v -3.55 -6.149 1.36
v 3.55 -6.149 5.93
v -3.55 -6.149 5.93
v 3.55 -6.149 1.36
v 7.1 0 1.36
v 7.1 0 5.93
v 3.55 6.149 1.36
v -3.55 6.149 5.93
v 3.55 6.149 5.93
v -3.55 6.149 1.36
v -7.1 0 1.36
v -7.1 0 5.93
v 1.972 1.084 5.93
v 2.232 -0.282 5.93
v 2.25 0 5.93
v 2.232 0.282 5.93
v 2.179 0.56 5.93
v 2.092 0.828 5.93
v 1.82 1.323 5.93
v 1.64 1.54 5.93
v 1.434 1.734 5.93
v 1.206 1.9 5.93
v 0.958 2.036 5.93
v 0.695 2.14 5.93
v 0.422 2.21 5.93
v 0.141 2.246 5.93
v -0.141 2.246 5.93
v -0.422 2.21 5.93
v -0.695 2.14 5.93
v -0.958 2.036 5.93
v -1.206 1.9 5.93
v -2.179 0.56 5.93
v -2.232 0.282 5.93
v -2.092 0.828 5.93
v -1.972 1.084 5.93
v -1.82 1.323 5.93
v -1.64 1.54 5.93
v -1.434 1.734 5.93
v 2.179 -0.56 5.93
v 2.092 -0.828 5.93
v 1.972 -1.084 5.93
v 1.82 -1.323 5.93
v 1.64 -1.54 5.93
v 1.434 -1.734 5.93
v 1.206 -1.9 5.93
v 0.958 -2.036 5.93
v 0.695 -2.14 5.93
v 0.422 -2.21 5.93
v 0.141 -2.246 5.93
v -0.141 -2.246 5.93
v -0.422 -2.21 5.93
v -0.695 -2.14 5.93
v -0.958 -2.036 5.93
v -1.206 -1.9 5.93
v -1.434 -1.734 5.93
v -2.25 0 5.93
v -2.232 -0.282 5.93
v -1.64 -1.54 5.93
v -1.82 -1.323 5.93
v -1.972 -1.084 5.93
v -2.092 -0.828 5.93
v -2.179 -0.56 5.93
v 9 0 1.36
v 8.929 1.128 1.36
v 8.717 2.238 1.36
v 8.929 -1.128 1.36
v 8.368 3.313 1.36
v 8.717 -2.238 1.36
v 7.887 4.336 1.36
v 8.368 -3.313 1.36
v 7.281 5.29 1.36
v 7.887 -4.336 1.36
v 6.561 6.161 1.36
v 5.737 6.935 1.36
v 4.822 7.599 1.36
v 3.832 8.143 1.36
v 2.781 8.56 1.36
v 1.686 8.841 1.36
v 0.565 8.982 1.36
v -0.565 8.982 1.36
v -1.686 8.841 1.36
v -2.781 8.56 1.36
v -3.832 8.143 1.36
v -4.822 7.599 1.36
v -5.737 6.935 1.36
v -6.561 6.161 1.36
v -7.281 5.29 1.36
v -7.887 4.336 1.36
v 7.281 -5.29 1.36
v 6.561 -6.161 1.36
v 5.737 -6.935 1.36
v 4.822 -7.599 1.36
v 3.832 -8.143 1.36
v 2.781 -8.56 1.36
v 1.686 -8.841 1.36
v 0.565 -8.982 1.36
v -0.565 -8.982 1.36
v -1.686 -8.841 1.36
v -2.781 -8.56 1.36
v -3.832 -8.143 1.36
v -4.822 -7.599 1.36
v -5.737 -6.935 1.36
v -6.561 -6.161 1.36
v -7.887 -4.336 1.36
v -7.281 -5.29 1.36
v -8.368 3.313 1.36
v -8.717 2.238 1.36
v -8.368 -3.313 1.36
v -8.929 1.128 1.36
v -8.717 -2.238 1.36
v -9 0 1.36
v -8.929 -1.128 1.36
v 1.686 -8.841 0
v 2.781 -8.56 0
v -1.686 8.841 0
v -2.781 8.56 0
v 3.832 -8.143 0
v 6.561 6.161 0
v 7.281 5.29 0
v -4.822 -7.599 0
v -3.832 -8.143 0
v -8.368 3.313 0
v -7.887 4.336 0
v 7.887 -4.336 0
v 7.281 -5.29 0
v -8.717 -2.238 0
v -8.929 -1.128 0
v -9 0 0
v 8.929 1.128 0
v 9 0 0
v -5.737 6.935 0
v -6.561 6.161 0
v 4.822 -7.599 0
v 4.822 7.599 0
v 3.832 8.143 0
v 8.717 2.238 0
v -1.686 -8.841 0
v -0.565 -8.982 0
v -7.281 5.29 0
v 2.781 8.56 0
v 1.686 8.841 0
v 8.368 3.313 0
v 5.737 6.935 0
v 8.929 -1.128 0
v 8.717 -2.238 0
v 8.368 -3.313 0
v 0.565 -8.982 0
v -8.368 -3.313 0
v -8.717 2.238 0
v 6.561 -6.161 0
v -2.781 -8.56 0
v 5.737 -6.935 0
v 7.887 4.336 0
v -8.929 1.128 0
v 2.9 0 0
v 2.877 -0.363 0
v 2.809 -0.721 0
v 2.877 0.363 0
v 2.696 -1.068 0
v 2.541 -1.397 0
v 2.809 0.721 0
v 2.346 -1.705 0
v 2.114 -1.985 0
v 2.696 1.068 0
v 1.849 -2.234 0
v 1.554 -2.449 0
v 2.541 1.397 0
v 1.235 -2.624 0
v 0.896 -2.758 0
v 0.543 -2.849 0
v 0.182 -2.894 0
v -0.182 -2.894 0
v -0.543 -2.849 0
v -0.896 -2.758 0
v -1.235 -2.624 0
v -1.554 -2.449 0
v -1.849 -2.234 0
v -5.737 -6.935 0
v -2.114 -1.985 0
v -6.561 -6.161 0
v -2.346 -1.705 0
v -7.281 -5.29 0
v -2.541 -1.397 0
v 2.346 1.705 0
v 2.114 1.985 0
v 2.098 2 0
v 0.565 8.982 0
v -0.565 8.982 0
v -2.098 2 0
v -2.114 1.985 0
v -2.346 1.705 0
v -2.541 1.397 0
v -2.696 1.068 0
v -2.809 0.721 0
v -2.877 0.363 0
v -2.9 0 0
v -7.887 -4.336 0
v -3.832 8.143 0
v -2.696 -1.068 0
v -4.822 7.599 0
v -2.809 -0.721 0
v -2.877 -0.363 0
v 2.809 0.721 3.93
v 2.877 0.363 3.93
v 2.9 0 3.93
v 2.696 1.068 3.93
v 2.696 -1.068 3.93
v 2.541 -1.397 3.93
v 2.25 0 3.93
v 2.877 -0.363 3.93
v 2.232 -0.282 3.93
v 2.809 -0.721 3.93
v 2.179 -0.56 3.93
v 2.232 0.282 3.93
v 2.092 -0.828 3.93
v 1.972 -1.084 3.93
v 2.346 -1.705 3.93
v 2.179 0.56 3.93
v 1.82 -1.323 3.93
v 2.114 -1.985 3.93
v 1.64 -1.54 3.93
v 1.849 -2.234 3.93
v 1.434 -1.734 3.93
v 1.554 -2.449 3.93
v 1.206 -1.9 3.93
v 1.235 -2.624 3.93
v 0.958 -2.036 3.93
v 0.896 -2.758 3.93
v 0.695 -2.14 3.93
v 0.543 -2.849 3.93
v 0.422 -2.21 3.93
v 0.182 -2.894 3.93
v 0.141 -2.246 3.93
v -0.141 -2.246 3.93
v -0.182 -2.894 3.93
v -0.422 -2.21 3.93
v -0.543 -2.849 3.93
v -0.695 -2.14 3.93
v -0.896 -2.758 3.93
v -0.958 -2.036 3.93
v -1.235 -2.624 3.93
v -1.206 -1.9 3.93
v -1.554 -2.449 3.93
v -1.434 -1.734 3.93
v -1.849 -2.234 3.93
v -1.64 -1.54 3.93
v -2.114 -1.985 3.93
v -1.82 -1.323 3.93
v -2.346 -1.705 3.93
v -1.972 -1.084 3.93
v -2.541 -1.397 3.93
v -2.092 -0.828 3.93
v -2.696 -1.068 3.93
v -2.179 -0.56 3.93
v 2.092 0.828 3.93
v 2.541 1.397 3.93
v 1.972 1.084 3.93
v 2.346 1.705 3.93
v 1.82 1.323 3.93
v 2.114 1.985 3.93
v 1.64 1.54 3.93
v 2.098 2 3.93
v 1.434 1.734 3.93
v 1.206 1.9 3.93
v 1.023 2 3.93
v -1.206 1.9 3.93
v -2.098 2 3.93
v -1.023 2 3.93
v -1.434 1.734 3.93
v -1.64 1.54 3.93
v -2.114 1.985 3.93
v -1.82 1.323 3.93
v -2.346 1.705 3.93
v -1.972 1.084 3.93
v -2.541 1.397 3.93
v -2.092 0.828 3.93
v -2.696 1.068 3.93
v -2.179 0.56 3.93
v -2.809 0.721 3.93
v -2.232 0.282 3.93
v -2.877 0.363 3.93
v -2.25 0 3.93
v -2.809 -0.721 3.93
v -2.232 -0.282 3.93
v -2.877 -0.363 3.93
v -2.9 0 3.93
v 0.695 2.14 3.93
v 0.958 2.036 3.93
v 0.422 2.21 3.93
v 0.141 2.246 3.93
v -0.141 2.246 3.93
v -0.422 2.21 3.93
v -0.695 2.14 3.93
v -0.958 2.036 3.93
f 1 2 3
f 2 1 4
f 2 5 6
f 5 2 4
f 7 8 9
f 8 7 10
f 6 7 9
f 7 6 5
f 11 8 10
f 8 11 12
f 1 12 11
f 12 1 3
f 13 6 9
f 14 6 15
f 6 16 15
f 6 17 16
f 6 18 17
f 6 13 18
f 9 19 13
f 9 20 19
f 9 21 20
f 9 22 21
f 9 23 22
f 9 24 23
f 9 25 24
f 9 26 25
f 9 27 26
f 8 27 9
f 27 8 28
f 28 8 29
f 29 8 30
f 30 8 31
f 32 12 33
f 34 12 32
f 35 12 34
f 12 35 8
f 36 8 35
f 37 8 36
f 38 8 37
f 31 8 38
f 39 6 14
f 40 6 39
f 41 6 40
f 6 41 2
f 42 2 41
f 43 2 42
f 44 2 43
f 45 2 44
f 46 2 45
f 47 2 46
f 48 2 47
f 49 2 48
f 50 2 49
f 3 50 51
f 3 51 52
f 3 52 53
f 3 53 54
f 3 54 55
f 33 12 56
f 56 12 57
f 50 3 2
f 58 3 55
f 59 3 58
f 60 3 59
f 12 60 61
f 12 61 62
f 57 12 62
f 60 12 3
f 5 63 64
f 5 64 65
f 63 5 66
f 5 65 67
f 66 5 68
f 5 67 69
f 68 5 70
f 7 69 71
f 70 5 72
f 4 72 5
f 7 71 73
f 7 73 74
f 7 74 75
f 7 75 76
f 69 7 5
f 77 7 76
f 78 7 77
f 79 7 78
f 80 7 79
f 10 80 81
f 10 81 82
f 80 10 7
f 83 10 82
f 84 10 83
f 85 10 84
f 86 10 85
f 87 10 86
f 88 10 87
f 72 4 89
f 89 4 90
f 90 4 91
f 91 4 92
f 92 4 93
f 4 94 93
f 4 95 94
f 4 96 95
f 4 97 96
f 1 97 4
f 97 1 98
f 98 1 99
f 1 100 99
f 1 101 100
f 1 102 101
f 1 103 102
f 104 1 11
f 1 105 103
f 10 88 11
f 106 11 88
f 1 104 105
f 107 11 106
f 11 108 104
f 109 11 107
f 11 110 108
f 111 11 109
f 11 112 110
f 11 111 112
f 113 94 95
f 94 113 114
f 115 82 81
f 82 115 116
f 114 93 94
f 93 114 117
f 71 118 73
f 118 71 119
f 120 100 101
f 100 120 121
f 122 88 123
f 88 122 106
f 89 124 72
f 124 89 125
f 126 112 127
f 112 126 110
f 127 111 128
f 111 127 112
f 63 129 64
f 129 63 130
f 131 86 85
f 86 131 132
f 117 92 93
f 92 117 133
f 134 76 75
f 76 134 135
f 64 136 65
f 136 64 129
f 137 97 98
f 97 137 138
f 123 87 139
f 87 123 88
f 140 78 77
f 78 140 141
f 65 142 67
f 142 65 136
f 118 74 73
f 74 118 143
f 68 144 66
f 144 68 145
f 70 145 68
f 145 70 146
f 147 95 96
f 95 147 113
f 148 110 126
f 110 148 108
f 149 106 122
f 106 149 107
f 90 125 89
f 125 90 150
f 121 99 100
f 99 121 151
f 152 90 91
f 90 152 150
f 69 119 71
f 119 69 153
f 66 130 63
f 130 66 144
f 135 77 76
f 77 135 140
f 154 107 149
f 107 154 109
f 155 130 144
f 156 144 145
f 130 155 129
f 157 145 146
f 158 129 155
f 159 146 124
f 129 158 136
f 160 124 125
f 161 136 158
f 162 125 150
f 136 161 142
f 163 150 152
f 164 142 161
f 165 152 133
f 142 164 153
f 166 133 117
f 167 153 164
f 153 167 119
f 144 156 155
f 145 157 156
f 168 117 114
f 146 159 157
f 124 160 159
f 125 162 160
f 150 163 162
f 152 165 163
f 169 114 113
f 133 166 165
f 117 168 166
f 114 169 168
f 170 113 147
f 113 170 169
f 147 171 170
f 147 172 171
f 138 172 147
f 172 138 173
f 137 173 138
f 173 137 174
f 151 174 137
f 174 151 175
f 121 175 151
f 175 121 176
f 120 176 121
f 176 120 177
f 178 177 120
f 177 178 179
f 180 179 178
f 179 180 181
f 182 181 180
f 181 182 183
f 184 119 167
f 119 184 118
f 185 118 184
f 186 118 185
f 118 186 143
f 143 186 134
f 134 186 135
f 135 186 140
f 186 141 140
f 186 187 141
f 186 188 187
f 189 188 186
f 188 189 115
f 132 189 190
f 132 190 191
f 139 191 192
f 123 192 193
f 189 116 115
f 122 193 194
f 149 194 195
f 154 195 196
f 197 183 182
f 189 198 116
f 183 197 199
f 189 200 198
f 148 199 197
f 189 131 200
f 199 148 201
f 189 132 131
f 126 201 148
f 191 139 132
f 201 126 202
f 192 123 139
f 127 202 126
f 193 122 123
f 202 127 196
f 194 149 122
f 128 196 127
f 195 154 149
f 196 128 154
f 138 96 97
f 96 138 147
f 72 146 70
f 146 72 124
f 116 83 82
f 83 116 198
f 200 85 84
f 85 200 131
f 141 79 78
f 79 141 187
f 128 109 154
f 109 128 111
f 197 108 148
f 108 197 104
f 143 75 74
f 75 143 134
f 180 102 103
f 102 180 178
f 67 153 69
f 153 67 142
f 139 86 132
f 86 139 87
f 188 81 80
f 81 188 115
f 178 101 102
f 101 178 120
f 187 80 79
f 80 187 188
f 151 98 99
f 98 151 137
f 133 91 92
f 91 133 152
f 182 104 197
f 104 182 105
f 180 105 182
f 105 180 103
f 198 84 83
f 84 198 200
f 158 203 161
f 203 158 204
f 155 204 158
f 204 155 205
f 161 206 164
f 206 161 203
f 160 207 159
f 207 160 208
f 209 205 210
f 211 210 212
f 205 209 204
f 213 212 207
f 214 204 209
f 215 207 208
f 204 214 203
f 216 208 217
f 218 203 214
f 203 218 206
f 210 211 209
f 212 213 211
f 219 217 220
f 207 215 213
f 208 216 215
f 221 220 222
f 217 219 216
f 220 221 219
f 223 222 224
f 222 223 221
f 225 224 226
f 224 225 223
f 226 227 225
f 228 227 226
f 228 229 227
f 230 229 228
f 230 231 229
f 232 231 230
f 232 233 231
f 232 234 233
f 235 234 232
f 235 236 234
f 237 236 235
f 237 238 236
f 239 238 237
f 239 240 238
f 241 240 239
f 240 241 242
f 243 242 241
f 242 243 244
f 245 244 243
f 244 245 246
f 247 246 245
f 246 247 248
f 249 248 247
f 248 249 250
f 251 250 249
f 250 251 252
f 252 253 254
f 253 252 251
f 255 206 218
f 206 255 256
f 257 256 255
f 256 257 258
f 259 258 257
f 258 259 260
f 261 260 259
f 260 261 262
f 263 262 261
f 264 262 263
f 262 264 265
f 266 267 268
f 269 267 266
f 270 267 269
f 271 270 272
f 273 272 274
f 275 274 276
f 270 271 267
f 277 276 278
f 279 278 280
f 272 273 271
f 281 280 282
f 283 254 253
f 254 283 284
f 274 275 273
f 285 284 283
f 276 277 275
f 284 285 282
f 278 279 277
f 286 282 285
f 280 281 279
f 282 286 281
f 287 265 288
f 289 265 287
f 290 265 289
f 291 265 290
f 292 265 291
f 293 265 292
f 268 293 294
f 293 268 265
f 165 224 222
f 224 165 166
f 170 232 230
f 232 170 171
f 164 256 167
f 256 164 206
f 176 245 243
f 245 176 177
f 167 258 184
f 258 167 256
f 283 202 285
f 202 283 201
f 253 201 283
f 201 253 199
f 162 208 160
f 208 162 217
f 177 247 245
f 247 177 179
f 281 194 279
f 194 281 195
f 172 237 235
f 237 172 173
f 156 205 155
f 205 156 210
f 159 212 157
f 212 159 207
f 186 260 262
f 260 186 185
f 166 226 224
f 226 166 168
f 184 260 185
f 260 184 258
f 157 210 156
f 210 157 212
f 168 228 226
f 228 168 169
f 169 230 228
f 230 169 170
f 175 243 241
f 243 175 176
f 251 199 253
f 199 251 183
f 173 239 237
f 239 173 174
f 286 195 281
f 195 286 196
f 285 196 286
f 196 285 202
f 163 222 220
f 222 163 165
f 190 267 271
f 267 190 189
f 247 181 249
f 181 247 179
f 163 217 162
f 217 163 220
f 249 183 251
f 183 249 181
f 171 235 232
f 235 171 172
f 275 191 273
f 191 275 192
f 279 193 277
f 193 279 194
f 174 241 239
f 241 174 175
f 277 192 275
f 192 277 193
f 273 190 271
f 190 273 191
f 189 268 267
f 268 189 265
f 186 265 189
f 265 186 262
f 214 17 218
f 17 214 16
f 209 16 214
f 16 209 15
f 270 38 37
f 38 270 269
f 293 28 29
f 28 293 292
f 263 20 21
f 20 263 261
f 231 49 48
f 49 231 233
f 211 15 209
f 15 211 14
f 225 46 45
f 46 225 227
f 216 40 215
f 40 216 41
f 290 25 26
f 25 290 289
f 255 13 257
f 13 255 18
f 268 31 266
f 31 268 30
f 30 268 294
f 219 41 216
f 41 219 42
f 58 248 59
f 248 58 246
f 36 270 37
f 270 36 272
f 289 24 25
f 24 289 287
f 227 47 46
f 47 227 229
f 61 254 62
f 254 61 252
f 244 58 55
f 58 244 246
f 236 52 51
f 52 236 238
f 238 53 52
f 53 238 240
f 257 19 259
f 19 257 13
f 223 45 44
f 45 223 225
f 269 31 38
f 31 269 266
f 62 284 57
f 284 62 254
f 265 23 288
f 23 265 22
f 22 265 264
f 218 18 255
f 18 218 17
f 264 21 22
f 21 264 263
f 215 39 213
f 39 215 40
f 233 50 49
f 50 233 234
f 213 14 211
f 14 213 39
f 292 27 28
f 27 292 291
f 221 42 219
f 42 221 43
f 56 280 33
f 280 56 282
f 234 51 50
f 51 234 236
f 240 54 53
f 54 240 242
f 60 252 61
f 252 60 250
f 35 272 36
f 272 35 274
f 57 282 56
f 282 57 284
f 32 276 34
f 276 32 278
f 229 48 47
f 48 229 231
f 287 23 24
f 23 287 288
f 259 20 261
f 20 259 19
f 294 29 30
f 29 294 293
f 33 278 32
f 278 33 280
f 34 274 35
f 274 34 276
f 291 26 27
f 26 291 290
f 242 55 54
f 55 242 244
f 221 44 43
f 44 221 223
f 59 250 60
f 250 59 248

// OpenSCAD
//Units: mm

hexHeight = 4.57;

spacerHeight = 1.36;
spacerDiameter = 18;

shaftDiameter = 4.5;

dShaftEnable = true;
dShaftDiameter = 5.8;
dShaftFlatDiameter = 4.9;
dShaftInset = 3.93;

INF = 100; //arbitrarily large value


difference() {
  union() {
    translate([0,0,spacerHeight]) M7();
    Spacer();
  }

  if (dShaftEnable) {
    translate([0,0,dShaftInset]) Shaft();
    DShaft();
  }
  else {
    Shaft();
  }
}


module Shaft() {
  cylinder(h=INF, d=shaftDiameter, $fn=50);  
}

module DShaft() {
  intersection() {
    cylinder(h=dShaftInset, d=dShaftDiameter, $fn=50);
    translate([-dShaftDiameter/2,-dShaftDiameter/2,-INF/2]) cube([dShaftDiameter, dShaftFlatDiameter, INF]);
  }
}

module Spacer() {
  cylinder(h=spacerHeight, d=spacerDiameter, $fn=50);
}

module M7() {
  cylinder(h=hexHeight, d=14.2, $fn = 6);
}
